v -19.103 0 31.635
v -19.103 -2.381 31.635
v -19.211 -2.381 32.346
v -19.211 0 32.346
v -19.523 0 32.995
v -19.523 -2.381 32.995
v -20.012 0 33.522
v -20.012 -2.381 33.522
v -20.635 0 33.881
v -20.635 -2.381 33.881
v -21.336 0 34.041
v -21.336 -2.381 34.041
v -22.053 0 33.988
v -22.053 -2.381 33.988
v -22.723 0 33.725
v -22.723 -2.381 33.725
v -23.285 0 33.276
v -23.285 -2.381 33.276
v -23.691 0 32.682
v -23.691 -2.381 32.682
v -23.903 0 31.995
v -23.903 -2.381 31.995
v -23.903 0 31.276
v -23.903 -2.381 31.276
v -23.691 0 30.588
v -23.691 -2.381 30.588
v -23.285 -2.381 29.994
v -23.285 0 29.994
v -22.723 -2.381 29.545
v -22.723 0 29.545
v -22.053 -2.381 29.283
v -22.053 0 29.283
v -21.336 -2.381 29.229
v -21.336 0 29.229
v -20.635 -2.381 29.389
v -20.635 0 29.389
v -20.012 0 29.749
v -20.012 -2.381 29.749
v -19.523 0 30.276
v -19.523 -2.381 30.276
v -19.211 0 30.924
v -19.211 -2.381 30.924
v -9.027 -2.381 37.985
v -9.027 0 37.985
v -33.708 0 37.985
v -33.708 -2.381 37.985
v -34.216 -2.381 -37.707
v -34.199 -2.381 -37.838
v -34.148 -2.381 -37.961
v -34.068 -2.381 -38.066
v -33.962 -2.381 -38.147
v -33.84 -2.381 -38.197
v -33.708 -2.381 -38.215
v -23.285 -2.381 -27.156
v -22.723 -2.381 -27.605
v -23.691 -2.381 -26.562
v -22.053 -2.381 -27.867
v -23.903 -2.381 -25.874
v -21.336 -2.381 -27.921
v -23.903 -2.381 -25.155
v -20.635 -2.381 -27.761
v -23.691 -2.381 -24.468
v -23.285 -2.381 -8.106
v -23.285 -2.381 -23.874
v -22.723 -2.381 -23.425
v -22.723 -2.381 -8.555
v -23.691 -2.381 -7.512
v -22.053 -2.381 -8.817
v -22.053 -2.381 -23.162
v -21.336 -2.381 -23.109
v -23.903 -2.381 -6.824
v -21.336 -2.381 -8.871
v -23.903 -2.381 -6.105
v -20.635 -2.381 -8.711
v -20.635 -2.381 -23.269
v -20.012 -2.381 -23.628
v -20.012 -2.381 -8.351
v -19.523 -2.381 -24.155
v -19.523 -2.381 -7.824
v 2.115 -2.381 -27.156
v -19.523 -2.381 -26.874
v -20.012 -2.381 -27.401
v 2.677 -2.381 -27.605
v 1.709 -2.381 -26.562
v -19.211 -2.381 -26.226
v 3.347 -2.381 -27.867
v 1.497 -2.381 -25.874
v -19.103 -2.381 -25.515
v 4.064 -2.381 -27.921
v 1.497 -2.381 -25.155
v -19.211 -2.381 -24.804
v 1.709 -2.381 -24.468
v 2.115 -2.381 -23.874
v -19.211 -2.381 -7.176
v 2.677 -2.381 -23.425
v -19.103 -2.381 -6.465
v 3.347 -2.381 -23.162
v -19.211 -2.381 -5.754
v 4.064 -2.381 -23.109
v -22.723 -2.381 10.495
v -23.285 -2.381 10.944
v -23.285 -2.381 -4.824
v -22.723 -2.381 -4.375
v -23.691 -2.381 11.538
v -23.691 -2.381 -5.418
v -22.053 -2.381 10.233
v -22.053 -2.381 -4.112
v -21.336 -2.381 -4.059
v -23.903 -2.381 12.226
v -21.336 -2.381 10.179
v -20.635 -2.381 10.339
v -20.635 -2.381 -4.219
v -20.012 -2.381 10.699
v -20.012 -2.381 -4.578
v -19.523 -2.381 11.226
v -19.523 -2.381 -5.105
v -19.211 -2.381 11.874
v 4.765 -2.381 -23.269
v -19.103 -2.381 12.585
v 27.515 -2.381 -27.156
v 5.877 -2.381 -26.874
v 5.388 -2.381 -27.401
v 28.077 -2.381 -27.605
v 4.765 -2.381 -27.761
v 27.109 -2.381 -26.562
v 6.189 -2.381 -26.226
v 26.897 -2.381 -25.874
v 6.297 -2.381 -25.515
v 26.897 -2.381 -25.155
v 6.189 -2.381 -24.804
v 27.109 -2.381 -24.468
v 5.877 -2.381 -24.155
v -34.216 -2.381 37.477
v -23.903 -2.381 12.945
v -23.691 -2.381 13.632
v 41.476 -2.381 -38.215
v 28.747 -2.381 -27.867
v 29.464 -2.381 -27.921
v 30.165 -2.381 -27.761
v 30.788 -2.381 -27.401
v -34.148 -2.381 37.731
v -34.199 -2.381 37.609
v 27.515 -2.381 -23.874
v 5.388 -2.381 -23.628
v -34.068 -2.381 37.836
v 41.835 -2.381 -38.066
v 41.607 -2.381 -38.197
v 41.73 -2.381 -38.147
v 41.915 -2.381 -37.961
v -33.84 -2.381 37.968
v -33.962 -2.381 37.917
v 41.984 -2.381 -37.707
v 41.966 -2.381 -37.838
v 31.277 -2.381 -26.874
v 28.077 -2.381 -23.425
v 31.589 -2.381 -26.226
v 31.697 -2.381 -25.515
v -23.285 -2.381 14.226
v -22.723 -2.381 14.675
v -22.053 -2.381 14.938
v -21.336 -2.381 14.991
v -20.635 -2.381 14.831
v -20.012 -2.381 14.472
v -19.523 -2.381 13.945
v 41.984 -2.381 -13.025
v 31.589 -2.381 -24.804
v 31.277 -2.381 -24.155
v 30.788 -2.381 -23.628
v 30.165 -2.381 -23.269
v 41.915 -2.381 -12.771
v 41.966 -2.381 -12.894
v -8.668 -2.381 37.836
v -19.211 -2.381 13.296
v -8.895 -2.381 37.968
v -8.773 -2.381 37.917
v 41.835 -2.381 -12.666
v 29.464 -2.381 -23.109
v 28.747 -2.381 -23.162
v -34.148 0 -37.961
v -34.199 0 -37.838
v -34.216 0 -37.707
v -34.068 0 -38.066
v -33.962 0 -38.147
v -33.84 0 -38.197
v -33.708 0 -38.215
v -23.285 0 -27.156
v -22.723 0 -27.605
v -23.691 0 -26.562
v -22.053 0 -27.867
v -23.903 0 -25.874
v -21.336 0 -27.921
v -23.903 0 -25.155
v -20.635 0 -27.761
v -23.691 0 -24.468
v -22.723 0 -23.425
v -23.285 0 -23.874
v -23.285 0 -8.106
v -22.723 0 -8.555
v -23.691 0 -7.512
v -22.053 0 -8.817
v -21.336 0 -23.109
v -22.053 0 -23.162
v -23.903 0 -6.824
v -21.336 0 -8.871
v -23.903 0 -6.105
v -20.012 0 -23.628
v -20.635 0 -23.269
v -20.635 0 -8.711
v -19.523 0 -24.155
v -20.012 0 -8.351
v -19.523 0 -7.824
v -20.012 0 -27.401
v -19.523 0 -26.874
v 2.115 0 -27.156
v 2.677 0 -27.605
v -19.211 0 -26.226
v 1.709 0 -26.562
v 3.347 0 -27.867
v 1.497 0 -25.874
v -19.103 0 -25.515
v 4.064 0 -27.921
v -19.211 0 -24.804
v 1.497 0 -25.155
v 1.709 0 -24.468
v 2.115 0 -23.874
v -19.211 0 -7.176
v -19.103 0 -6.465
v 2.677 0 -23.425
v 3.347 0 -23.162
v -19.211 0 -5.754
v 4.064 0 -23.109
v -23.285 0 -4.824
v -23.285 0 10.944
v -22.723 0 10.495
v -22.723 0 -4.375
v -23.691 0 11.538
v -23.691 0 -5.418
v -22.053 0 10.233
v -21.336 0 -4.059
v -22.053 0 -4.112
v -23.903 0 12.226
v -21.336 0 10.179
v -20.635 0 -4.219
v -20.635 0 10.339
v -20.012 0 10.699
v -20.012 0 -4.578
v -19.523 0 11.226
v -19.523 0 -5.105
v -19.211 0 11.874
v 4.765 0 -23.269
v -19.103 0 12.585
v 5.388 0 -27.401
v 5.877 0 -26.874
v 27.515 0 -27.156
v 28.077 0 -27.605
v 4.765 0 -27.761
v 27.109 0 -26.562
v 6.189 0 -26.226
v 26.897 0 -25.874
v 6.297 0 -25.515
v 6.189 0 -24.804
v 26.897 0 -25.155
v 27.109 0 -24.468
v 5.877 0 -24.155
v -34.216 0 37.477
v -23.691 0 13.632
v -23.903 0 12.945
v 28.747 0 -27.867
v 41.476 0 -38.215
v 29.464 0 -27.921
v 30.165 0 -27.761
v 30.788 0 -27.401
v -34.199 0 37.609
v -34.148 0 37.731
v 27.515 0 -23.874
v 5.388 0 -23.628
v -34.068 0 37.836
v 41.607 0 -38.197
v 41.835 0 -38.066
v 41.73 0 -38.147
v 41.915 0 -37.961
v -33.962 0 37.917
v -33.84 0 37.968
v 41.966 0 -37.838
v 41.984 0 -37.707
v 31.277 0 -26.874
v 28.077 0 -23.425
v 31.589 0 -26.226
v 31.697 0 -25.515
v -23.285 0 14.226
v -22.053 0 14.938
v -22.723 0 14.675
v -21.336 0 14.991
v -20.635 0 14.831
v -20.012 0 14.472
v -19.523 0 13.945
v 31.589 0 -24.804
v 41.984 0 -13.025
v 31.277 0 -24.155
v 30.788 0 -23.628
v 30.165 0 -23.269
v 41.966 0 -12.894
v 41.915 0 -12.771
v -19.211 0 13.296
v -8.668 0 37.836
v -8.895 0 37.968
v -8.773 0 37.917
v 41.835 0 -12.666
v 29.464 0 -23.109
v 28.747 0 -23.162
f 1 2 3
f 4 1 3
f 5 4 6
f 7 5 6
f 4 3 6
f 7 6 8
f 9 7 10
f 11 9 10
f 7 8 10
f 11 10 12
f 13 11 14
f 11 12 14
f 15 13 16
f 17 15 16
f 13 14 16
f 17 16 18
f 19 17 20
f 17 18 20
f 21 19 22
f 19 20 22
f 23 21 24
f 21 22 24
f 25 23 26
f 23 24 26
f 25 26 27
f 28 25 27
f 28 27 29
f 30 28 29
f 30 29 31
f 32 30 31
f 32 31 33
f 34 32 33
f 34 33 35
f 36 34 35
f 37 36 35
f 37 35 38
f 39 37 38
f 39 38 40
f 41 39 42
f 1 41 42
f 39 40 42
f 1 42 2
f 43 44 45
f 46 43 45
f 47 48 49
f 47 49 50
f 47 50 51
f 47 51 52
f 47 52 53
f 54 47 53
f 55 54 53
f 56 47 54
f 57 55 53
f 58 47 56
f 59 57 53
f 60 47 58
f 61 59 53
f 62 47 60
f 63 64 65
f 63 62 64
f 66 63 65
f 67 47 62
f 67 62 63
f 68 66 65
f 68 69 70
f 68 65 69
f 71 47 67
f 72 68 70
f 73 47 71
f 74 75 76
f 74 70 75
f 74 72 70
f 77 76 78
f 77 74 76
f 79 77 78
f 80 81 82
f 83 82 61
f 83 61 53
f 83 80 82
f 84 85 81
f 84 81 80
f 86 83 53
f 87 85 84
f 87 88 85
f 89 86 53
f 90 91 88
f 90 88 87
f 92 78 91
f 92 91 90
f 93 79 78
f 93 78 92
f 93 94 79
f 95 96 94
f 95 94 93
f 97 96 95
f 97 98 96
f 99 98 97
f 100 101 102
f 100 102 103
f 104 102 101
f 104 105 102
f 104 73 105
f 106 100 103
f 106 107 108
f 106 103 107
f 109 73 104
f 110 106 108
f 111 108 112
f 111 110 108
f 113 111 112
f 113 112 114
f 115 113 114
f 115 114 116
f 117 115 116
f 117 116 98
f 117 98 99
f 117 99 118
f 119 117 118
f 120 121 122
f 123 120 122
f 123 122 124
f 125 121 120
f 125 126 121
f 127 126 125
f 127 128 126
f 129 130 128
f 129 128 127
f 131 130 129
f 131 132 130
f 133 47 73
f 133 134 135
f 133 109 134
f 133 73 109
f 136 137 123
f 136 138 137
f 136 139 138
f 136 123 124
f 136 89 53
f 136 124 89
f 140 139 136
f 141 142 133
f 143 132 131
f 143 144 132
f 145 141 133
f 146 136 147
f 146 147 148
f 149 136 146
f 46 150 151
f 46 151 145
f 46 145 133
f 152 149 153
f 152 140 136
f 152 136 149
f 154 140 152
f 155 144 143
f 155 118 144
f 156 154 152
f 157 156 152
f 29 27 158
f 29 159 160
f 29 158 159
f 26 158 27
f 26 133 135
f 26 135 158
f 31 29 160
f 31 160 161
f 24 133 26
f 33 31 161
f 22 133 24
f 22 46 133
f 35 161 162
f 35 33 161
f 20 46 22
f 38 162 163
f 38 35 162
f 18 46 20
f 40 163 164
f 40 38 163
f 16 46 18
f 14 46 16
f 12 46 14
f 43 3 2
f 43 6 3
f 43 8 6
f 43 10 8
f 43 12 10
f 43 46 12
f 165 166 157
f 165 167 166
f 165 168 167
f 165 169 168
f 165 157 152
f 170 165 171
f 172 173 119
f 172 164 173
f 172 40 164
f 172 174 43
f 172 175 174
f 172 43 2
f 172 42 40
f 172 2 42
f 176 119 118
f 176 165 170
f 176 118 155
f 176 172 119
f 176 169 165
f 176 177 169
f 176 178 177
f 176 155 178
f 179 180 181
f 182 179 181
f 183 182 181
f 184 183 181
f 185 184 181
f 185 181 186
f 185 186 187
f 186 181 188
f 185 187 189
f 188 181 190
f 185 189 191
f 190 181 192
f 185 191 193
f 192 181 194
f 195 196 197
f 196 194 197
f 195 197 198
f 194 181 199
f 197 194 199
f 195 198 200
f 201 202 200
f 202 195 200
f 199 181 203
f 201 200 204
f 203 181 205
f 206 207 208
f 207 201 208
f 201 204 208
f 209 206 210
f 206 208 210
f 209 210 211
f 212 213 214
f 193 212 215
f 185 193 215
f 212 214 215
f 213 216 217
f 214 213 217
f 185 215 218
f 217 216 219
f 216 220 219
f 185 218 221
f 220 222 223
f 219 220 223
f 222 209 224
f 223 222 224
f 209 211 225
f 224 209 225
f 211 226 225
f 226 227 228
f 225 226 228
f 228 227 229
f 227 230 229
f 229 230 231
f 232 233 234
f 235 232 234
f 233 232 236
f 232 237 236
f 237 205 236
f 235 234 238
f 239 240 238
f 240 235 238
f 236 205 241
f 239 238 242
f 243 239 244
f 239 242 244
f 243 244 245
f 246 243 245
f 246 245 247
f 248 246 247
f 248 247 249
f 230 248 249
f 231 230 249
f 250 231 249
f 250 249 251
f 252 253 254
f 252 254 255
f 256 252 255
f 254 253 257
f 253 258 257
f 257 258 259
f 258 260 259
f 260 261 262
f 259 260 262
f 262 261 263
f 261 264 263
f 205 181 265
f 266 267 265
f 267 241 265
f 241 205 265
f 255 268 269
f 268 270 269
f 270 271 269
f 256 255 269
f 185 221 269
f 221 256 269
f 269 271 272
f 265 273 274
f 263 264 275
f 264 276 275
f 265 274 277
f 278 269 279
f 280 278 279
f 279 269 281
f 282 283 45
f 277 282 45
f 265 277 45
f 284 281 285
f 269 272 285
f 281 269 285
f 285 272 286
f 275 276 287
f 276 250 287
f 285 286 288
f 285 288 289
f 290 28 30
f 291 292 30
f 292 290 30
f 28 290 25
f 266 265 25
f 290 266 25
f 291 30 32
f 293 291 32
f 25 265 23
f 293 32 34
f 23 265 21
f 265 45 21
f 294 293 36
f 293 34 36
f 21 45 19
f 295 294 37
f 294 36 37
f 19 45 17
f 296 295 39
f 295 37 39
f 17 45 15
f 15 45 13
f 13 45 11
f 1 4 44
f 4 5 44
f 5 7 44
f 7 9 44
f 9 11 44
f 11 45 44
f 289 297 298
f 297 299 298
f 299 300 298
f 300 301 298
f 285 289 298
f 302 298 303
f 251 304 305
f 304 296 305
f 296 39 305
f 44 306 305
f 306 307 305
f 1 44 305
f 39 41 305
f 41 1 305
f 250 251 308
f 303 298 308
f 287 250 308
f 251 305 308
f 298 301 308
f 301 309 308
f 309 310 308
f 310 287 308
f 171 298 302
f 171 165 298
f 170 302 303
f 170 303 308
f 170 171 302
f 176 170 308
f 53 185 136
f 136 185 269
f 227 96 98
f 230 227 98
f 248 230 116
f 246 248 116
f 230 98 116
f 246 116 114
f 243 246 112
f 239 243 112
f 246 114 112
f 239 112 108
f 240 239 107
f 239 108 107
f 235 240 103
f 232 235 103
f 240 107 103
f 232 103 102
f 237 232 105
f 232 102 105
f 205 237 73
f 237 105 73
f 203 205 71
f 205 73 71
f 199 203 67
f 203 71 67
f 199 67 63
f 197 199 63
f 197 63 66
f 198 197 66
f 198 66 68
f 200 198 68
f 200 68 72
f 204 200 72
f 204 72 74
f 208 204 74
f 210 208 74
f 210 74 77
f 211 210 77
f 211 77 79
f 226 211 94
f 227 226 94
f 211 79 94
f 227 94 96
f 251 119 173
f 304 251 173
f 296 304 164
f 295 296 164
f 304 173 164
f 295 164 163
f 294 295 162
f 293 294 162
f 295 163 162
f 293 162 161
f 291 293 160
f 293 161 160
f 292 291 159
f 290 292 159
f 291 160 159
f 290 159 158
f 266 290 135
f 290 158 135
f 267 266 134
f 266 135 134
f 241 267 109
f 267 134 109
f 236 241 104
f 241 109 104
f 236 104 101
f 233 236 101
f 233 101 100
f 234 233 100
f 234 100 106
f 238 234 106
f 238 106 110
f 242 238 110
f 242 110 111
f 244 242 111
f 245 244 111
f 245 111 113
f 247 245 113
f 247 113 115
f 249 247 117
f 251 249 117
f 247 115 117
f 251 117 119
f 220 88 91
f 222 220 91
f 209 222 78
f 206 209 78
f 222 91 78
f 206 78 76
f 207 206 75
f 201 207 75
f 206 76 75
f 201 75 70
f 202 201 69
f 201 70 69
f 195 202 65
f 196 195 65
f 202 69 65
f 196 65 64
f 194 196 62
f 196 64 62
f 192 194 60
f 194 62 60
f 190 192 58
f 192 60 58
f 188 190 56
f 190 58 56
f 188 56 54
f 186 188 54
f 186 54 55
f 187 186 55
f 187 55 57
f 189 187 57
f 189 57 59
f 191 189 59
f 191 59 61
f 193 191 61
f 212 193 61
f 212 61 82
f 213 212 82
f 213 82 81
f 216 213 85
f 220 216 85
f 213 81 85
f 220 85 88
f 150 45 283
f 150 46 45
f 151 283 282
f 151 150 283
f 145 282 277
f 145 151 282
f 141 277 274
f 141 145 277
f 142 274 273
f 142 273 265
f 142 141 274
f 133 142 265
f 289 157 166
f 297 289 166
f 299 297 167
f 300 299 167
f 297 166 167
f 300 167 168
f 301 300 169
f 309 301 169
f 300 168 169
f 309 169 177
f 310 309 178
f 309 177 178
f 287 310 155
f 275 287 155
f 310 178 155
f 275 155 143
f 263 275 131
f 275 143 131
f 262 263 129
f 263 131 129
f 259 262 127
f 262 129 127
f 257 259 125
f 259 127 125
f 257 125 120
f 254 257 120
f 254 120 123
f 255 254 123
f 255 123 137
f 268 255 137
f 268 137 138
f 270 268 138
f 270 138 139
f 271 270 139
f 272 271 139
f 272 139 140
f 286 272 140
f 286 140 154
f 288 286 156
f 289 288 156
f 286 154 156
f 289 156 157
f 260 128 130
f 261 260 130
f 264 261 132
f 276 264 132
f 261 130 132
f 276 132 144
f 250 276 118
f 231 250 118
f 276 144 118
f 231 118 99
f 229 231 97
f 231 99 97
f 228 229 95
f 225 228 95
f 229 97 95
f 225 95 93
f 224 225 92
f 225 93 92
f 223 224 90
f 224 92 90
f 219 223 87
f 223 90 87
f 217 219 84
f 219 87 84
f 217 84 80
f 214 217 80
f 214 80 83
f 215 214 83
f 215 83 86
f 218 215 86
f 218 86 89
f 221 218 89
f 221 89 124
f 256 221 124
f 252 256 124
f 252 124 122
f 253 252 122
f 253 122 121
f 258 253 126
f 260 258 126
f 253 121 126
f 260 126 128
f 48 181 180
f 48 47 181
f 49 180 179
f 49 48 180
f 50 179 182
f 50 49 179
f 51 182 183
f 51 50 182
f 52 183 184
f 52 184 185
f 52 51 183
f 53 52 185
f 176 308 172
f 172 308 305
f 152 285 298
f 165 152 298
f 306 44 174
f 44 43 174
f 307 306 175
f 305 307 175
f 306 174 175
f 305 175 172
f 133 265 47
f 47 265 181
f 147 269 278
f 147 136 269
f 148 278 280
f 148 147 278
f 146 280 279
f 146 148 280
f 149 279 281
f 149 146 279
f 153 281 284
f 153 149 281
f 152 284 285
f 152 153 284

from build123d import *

# Parameters (mm, degrees)
F1_DEPTH = 2.38125
F2_R     = 0.508
F3_R     = 2.413
F4_DEPTH = 2.38125


with BuildPart() as f1:
    # F0 (on Front) → F1 (new body)
    with BuildSketch(Plane.XZ):
        Polygon((-8.816487, 37.985209), (-34.216487, 37.985209), (-34.216487, -38.214791), (41.983513, -38.214791), (41.983513, -12.814791), align=None)
    extrude(amount=F1_DEPTH)

    # F2
    f2_edges = [f1.edges().sort_by_distance(p)[0] for p in [
        (-34.216487, -1.190625, 37.985209),
        (-8.816487, -1.190625, 37.985209),
        (-34.216487, -1.190625, -38.214791),
        (41.983513, -1.190625, -12.814791),
        (41.983513, -1.190625, -38.214791),
    ]]
    fillet(f2_edges, radius=F2_R)

    # F3 (on face) → F4 (cut)
    with BuildSketch(Plane.XZ.offset(2.38125)):
        with Locations((-21.516487, 31.635209)):
            Circle(F3_R)
        with Locations((-21.516487, 12.585209)):
            Circle(F3_R)
        with Locations((-21.516487, -6.464791)):
            Circle(F3_R)
        with Locations((-21.516487, -25.514791)):
            Circle(F3_R)
        with Locations((3.883513, -25.514791)):
            Circle(F3_R)
        with Locations((29.283513, -25.514791)):
            Circle(F3_R)
    extrude(amount=-F4_DEPTH, mode=Mode.SUBTRACT)


solid = f1.part
